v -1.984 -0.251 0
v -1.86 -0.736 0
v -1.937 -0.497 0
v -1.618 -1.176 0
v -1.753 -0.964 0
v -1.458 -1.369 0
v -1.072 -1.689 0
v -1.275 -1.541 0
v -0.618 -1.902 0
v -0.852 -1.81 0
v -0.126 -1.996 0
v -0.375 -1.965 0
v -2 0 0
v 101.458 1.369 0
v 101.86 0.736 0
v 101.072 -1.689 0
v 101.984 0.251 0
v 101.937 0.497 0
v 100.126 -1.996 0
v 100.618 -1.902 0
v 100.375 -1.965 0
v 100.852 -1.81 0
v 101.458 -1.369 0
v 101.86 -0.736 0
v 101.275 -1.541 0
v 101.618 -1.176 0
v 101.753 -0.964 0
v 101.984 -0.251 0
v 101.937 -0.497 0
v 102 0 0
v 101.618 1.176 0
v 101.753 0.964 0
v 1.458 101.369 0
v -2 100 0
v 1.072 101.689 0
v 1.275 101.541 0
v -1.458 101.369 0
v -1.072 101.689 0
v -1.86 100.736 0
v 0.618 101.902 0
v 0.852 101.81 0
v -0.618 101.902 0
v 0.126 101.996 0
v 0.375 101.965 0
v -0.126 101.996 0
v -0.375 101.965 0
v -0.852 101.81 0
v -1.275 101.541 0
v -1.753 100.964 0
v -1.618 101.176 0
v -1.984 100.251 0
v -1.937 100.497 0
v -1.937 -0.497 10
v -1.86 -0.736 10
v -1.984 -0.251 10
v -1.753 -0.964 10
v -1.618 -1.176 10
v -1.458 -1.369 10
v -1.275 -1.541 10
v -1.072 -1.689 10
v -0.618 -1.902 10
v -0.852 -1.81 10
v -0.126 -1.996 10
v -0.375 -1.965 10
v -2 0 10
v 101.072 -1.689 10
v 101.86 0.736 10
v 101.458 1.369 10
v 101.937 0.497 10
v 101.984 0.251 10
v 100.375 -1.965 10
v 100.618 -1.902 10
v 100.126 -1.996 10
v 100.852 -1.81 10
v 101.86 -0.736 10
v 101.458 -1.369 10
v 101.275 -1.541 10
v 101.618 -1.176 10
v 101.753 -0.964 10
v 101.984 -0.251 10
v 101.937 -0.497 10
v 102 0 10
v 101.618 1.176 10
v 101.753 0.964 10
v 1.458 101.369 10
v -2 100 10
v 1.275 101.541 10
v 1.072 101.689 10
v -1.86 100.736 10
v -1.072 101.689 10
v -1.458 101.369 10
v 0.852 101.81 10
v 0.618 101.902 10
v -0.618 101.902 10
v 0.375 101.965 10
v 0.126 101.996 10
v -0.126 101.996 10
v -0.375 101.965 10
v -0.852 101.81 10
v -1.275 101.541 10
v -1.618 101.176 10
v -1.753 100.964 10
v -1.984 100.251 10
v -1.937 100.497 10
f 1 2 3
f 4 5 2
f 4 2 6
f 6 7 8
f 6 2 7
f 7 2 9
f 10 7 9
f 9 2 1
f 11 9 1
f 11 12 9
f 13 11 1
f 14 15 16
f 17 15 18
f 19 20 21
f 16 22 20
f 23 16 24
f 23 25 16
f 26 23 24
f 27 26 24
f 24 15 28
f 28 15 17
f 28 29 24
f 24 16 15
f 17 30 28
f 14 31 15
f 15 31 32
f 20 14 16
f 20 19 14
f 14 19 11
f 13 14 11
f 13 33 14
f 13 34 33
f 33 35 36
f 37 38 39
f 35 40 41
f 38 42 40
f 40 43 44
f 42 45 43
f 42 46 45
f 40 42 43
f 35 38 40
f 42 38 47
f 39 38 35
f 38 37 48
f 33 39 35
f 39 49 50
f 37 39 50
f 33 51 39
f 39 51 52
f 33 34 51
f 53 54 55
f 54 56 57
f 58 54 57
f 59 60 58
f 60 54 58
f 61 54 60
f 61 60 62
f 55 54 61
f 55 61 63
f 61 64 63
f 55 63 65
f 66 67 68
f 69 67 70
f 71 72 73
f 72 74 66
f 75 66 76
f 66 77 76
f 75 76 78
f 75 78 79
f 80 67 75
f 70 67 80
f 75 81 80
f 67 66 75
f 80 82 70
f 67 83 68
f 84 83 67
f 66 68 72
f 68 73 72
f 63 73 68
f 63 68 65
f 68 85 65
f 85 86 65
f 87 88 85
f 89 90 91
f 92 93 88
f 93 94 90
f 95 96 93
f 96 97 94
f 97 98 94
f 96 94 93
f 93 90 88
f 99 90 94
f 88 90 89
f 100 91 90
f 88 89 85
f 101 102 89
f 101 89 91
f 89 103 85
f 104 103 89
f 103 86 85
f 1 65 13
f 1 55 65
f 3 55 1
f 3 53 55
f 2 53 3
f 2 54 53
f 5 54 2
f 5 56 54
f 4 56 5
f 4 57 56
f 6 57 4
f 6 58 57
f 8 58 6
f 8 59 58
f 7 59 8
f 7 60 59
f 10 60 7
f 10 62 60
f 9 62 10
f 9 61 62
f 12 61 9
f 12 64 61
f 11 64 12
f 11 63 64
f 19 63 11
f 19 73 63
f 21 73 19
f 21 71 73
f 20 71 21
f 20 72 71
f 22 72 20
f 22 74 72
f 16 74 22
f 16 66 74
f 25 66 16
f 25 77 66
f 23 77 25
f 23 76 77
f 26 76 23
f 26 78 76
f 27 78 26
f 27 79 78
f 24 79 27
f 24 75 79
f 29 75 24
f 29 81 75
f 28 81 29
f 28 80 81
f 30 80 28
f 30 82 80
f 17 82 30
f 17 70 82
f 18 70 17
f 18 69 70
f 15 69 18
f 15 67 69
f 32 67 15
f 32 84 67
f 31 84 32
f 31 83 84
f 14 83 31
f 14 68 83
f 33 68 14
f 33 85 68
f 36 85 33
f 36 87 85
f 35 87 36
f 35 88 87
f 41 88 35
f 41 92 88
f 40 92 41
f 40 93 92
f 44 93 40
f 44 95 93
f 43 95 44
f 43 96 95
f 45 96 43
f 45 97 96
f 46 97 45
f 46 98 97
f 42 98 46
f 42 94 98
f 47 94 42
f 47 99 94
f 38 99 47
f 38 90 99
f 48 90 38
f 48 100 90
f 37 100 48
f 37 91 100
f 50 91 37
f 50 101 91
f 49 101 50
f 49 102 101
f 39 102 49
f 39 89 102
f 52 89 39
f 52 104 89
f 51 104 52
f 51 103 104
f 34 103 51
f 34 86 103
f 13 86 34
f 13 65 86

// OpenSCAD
/*
 * OpenSCAD Workshop Examples
 * Copyright (c) 2013-2018 Anar Software LLC. < http://anars.com >
 *
 * This program is free software: you can redistribute it and/or modify it under
 * the terms of the GNU General Public License as published by the Free Software
 * Foundation, either version 3 of the License, or (at your option) any later
 * version.
 *
 * This program is distributed in the hope that it will be useful, but WITHOUT
 * ANY WARRANTY; without even the implied warranty of MERCHANTABILITY or FITNESS
 * FOR A PARTICULAR PURPOSE. See the GNU General Public License for more details.
 *
 * You should have received a copy of the GNU General Public License along with
 * this program. If not, see < http://www.gnu.org/licenses/ >
 *
 */

$fn=50;

 //polygon(points=[[0,0],[100,0],[0,100],[10,10],[80,10],[10,80]], paths=[[0,1,2],[3,4,5]],convexity=10);
 
 roundedPolygon([[0,0],[100,0],[0,100],[10,10],[80,10],[10,80]], [[0,1,2],[3,4,5]], 10, 2);
 
module roundedPolygon(points, paths, height, radius) {
    linear_extrude(height=height, convexity=3)
    hull()
    for(pt = points) {
        translate([pt[0], pt[1], 0])
            circle(r=radius);
    }
}
